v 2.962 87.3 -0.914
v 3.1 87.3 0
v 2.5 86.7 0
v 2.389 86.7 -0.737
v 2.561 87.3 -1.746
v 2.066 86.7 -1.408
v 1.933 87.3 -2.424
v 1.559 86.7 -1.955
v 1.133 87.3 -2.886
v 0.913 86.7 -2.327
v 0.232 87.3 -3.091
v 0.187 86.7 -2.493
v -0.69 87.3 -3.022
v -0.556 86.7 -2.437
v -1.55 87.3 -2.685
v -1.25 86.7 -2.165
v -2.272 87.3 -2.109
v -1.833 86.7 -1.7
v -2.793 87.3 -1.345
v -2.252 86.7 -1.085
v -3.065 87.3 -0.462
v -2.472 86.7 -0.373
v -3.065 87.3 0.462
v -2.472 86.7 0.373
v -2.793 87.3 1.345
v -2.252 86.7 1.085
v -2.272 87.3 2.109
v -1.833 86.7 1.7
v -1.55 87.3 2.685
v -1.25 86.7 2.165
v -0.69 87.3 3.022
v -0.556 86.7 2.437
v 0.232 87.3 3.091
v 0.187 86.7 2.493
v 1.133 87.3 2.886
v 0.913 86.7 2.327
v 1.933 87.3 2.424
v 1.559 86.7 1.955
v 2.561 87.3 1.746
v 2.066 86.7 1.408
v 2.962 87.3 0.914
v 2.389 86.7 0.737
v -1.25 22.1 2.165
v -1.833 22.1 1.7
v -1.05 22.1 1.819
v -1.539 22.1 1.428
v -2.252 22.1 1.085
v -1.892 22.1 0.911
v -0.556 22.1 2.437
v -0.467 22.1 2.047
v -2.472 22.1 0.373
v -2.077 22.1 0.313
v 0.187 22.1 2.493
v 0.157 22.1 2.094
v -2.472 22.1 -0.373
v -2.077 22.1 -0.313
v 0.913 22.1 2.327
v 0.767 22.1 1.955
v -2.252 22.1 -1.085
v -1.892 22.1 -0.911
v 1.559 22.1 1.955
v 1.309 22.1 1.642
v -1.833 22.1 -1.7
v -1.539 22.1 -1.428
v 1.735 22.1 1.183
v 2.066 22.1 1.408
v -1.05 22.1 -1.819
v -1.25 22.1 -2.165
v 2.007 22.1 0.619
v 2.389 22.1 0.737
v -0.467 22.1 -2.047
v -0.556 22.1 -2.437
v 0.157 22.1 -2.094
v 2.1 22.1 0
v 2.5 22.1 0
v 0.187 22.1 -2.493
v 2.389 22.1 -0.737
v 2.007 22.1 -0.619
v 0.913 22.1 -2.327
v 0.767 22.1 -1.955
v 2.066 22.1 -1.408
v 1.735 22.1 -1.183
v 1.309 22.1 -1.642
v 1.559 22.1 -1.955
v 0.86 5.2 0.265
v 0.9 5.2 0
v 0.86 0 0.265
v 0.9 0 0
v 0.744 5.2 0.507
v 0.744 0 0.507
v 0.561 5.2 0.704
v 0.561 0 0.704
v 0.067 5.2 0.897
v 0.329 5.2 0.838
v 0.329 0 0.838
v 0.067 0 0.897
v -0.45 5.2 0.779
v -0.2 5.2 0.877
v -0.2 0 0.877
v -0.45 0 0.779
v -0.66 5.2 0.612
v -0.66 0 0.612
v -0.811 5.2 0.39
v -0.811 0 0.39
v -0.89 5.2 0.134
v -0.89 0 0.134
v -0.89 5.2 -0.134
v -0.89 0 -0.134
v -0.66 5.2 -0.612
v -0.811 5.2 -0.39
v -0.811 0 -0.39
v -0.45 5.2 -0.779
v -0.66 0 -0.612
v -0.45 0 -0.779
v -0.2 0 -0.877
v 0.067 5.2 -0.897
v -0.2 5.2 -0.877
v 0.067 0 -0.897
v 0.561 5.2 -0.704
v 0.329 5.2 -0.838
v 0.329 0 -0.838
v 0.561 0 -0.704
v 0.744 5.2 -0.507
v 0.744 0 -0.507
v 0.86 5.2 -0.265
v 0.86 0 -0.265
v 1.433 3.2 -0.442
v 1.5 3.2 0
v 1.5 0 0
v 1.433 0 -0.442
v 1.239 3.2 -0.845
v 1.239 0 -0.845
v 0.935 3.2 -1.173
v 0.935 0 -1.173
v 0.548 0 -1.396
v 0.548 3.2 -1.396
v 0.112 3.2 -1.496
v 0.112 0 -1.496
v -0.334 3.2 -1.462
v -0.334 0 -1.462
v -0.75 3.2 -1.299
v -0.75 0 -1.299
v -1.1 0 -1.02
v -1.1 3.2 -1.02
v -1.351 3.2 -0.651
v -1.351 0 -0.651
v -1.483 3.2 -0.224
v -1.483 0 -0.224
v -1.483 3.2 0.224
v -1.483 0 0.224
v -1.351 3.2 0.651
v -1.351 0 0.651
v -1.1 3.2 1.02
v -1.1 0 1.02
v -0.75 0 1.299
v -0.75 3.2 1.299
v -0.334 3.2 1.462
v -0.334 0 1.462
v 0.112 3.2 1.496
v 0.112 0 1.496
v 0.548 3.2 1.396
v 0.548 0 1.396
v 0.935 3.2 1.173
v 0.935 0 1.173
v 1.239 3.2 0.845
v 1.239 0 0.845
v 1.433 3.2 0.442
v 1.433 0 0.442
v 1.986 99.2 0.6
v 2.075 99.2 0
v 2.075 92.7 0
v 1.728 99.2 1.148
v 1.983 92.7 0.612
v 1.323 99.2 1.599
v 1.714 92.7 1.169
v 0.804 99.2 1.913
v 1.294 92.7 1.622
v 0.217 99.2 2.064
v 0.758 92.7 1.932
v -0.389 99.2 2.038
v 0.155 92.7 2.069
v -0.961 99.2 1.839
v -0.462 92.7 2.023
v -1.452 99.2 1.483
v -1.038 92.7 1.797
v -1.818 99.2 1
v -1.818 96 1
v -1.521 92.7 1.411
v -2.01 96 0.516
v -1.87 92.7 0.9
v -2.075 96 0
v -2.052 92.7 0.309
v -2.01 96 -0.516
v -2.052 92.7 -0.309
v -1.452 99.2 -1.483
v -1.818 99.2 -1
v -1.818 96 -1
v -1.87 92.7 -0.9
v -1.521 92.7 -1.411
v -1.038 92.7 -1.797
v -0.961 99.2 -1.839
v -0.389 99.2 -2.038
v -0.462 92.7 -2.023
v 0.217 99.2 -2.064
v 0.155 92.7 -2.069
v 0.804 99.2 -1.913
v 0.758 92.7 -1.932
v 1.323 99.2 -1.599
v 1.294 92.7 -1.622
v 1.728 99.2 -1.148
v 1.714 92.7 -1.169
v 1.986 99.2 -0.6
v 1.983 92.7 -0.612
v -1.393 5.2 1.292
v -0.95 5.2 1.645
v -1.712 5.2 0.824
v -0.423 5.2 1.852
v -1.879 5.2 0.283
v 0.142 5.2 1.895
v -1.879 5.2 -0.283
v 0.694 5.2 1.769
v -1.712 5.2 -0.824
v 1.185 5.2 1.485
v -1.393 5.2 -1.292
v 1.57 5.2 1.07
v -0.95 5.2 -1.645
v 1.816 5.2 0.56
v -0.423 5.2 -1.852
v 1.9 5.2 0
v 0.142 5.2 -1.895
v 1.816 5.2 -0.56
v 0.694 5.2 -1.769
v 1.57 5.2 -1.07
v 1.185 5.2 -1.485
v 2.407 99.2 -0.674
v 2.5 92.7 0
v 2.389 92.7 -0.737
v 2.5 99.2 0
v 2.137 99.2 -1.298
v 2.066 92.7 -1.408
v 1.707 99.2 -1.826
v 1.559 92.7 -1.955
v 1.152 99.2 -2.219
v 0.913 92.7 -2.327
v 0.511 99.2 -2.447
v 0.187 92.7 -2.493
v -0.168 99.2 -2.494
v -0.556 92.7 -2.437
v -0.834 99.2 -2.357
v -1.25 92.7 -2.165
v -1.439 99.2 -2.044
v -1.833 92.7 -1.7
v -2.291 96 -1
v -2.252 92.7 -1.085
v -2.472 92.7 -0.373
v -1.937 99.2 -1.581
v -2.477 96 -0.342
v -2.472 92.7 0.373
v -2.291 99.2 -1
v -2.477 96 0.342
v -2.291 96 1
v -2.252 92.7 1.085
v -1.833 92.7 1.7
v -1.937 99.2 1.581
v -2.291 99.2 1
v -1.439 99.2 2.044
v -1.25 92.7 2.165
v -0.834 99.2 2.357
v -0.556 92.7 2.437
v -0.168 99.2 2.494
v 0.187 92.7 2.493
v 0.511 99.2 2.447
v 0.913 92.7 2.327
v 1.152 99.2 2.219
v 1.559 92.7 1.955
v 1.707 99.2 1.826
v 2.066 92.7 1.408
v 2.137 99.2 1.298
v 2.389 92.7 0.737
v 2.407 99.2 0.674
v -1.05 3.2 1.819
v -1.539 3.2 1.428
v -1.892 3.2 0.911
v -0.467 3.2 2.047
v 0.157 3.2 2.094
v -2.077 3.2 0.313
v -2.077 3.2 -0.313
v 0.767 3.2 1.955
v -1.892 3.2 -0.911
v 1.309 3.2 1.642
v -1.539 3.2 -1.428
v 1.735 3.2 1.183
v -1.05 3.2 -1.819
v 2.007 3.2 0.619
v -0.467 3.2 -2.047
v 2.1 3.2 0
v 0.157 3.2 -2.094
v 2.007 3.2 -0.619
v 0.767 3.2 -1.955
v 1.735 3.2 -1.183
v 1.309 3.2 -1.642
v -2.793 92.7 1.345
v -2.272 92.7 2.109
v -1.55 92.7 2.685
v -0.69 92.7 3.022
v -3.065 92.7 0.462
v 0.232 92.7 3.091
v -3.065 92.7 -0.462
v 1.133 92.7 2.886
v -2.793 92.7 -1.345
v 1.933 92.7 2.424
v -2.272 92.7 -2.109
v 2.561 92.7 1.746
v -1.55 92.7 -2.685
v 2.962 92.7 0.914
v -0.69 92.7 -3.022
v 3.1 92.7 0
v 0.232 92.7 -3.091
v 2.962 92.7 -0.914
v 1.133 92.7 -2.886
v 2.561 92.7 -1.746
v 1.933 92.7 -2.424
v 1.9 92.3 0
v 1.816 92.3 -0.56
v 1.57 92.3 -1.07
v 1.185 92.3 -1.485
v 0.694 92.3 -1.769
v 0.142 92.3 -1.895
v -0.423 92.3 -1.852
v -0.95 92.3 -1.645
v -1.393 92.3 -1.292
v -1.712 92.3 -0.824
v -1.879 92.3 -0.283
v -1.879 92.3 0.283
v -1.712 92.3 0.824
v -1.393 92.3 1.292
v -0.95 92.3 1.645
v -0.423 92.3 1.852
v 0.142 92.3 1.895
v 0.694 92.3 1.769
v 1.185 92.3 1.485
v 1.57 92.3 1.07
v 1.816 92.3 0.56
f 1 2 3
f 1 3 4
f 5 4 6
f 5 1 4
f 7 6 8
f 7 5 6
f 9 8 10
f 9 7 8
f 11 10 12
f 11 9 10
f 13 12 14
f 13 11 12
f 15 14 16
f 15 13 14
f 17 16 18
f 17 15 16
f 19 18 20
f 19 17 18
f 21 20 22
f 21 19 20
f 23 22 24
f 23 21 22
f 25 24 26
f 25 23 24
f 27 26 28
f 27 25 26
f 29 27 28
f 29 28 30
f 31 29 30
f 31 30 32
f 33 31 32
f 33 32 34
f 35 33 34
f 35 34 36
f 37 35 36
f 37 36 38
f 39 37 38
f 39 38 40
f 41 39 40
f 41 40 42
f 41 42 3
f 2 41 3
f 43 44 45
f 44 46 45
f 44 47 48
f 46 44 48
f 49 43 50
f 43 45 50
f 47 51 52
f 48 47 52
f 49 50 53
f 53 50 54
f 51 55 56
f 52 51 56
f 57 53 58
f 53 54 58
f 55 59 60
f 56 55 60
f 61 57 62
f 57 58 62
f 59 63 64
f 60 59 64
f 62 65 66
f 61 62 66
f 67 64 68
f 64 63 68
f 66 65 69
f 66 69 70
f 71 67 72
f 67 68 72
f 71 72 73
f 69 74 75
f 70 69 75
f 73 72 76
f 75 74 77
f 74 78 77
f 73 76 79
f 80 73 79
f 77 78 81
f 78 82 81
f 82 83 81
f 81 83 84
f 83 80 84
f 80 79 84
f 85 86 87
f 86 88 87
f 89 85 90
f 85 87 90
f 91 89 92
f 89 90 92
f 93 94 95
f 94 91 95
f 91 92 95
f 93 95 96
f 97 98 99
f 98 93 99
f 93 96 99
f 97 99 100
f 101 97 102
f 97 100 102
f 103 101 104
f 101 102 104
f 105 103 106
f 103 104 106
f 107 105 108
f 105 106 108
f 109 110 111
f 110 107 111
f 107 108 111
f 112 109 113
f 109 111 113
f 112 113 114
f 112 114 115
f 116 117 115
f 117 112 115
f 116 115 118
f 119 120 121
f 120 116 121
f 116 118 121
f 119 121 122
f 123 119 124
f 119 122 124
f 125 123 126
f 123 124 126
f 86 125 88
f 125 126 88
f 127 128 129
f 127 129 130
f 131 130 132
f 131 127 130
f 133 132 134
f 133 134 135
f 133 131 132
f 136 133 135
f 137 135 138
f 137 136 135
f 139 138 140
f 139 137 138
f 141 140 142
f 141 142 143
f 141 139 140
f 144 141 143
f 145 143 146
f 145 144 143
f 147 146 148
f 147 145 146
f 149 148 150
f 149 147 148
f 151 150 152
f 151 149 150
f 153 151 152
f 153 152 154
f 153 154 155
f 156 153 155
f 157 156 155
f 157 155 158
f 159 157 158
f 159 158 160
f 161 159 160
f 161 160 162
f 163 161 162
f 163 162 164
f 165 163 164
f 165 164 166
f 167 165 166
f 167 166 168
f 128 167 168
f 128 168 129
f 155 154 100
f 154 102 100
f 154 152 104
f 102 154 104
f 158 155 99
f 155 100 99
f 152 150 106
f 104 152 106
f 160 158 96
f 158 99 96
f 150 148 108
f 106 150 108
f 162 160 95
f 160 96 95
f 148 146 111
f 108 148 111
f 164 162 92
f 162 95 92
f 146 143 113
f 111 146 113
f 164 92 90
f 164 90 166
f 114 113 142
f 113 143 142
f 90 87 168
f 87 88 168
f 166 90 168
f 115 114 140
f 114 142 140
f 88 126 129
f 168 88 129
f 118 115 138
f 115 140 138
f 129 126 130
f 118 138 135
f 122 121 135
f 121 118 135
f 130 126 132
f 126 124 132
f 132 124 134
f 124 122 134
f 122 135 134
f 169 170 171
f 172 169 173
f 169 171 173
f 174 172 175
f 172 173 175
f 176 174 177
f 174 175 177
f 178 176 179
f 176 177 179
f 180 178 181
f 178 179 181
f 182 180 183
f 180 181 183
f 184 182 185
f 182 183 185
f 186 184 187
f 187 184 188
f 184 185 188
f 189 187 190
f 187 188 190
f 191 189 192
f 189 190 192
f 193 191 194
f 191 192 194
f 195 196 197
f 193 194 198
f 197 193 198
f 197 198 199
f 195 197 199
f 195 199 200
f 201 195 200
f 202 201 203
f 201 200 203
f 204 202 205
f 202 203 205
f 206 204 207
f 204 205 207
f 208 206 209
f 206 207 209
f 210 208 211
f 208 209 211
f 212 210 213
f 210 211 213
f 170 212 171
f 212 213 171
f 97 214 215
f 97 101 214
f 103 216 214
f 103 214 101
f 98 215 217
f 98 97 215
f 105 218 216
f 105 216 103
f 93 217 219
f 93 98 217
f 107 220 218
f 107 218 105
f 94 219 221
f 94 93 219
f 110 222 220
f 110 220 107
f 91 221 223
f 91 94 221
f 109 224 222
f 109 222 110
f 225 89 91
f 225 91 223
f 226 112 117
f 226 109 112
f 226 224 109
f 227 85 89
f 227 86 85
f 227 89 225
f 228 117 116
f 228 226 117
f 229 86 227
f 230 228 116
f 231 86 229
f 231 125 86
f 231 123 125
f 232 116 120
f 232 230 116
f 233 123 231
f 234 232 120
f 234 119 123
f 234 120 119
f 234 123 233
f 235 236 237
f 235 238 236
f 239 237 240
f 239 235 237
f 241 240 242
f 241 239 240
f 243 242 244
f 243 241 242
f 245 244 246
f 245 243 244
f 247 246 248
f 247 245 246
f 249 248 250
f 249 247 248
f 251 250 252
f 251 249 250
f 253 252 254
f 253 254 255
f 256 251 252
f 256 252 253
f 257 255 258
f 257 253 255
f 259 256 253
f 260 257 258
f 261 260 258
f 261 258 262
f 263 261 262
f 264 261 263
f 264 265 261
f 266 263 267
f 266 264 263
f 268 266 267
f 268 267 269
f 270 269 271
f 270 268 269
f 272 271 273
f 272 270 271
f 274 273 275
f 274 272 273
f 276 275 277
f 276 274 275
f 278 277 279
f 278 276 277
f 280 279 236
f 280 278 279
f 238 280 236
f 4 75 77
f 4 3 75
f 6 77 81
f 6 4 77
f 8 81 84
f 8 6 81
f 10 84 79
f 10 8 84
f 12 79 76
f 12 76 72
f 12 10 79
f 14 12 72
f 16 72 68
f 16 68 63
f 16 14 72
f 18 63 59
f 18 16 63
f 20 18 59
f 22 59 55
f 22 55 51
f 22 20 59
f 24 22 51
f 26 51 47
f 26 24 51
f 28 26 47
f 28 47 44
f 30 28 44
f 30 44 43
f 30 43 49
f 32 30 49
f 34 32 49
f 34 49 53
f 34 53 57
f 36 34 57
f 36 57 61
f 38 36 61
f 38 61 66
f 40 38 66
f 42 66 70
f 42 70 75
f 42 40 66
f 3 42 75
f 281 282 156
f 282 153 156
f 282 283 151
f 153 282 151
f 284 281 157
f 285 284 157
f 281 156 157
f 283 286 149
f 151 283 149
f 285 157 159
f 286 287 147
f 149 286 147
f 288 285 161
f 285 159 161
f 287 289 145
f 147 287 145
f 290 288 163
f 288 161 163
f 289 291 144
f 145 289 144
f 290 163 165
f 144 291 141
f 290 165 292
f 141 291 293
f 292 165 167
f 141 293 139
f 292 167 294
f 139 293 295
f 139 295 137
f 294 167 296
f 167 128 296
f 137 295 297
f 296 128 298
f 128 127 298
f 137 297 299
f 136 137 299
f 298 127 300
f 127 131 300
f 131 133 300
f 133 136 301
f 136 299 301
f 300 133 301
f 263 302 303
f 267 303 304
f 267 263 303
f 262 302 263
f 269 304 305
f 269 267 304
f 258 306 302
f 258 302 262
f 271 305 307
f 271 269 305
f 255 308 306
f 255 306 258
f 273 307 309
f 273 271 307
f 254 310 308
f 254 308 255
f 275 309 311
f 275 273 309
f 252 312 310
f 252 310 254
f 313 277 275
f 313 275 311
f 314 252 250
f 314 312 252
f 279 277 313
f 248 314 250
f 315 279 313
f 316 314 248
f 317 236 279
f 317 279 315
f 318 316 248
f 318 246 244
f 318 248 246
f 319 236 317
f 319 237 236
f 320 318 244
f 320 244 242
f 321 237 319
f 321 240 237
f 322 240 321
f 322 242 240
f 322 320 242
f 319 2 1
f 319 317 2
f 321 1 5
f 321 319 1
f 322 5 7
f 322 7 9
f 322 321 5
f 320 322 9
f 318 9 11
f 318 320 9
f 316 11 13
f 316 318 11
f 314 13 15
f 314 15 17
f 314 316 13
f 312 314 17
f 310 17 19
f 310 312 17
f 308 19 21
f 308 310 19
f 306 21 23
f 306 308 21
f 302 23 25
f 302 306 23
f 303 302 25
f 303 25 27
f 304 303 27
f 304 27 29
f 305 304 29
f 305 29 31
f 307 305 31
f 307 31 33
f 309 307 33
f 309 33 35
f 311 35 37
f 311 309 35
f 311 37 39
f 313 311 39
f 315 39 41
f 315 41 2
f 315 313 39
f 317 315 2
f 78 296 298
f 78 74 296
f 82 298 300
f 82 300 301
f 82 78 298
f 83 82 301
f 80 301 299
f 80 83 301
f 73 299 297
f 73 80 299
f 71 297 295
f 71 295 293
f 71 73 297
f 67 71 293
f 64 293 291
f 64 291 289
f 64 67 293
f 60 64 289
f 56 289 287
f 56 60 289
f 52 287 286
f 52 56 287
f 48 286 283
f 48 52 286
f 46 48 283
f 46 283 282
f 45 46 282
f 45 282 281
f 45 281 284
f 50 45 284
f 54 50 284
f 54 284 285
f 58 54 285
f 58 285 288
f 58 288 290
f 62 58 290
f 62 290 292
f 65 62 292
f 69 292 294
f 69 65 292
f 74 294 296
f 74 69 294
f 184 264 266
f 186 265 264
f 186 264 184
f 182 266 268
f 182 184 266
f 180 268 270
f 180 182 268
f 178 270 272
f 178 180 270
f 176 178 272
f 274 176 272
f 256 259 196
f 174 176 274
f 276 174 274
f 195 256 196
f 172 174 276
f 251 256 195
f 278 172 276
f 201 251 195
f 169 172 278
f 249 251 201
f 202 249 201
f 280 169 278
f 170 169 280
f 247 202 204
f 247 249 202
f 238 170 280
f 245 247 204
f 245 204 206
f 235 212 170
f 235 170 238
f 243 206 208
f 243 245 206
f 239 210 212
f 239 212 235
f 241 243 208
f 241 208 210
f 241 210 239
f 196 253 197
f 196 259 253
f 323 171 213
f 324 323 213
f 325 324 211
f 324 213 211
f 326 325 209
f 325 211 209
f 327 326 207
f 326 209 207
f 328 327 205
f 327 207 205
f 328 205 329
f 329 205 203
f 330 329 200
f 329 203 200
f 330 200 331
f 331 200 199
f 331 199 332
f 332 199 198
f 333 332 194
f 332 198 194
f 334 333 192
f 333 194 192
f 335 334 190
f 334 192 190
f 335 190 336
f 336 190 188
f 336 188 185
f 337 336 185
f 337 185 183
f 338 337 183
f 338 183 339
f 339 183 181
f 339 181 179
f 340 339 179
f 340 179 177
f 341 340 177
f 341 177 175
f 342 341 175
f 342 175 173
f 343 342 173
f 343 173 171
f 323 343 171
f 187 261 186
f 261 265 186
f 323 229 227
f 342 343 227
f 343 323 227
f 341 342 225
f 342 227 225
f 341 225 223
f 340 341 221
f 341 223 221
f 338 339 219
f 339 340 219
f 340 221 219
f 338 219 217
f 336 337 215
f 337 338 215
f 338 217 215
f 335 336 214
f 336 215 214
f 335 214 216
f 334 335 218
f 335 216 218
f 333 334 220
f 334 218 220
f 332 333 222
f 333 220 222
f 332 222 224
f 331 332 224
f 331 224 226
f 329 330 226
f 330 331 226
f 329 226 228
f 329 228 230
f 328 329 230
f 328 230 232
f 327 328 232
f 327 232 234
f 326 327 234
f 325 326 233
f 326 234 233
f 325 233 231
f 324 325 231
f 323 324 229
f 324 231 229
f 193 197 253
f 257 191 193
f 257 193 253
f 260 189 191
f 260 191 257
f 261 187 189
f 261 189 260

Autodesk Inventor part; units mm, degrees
ref_plane "YZ Plane" through (0, 0, 0) normal (1, 0, 0) x (0, 1, 0)
ref_plane "XZ Plane" through (0, 0, 0) normal (0, 1, 0) x (-1, 0, 0)
ref_plane "XY Plane" through (0, 0, 0) normal (0, 0, 1) x (1, 0, 0)
sketch "Sketch1" plane through (0, 0, 0) normal (0, 0, 1) x (1, 0, 0)
  line L0 (0, 0) -> (0, 99.2)
  line L1 (0.9, 0) -> (1.5, 0)
  line L2 (1.5, 0) -> (1.5, 3.2)
  line L3 (1.5, 3.2) -> (2.1, 3.2)
  line L4 (2.1, 3.2) -> (2.1, 22.1)
  line L5 (2.1, 22.1) -> (2.5, 22.1)
  line L6 (2.5, 22.1) -> (2.5, 86.7)
  line L7 (2.5, 86.7) -> (3.1, 87.3)
  line L8 (3.1, 87.3) -> (3.1, 92.7)
  line L9 (3.1, 92.7) -> (2.5, 92.7)
  line L10 (2.5, 92.7) -> (2.5, 99.2)
  line L11 (2.5, 99.2) -> (2.075, 99.2)
  line L12 (2.075, 99.2) -> (2.075, 92.7)
  line L13 (2.075, 92.7) -> (1.9, 92.3)
  line L14 (1.9, 92.3) -> (1.9, 5.2)
  line L15 (1.9, 5.2) -> (0.9, 5.2)
  line L16 (0.9, 5.2) -> (0.9, 0)
  dimension "d0" = 45
  dimension "d1" = 99.2
  dimension "d2" = 92.7
  dimension "d3" = 86.7
  dimension "d4" = 22.1
  dimension "d5" = 3.2
  dimension "d6" = 1.8
  dimension "d7" = 3
  dimension "d8" = 4.2
  dimension "d9" = 5.2
  dimension "d10" = 3.8
  dimension "d11" = 4.15
  dimension "d12" = 5
  dimension "d13" = 6.2
  dimension "d14" = 92.3
  dimension "d15" = 5
revolve "Revolution1" add sketch "Sketch1" angle 360 about axis through (0, 0, 0) along (0, 1, 0)
sketch "Sketch2" plane through (0, 0, 0) normal (0, 0, 1) x (1, 0, 0)
  line L0 (-0.9, 0) -> (0.9, 0) projected
  line L1 (-4, 96) -> (0, 96) construction
  line L2 (0, -19.84) -> (0, 119.04) projected
  line L3 (0, 96) -> (-8, 96)
  line L4 (-8, 96) -> (-8, 99.2)
  line L5 (-8, 99.2) -> (0, 99.2)
  line L6 (0, 99.2) -> (0, 96)
  line L7 (-2.075, 99.2) -> (2.075, 99.2) projected
  dimension "d17" = 96
  dimension "d18" = 4
  dimension "d19" = 8
extrude "Extrusion1" cut sketch "Sketch2" against normal mid plane 2
properties part number "PP-09" material "ABS Plastic"
